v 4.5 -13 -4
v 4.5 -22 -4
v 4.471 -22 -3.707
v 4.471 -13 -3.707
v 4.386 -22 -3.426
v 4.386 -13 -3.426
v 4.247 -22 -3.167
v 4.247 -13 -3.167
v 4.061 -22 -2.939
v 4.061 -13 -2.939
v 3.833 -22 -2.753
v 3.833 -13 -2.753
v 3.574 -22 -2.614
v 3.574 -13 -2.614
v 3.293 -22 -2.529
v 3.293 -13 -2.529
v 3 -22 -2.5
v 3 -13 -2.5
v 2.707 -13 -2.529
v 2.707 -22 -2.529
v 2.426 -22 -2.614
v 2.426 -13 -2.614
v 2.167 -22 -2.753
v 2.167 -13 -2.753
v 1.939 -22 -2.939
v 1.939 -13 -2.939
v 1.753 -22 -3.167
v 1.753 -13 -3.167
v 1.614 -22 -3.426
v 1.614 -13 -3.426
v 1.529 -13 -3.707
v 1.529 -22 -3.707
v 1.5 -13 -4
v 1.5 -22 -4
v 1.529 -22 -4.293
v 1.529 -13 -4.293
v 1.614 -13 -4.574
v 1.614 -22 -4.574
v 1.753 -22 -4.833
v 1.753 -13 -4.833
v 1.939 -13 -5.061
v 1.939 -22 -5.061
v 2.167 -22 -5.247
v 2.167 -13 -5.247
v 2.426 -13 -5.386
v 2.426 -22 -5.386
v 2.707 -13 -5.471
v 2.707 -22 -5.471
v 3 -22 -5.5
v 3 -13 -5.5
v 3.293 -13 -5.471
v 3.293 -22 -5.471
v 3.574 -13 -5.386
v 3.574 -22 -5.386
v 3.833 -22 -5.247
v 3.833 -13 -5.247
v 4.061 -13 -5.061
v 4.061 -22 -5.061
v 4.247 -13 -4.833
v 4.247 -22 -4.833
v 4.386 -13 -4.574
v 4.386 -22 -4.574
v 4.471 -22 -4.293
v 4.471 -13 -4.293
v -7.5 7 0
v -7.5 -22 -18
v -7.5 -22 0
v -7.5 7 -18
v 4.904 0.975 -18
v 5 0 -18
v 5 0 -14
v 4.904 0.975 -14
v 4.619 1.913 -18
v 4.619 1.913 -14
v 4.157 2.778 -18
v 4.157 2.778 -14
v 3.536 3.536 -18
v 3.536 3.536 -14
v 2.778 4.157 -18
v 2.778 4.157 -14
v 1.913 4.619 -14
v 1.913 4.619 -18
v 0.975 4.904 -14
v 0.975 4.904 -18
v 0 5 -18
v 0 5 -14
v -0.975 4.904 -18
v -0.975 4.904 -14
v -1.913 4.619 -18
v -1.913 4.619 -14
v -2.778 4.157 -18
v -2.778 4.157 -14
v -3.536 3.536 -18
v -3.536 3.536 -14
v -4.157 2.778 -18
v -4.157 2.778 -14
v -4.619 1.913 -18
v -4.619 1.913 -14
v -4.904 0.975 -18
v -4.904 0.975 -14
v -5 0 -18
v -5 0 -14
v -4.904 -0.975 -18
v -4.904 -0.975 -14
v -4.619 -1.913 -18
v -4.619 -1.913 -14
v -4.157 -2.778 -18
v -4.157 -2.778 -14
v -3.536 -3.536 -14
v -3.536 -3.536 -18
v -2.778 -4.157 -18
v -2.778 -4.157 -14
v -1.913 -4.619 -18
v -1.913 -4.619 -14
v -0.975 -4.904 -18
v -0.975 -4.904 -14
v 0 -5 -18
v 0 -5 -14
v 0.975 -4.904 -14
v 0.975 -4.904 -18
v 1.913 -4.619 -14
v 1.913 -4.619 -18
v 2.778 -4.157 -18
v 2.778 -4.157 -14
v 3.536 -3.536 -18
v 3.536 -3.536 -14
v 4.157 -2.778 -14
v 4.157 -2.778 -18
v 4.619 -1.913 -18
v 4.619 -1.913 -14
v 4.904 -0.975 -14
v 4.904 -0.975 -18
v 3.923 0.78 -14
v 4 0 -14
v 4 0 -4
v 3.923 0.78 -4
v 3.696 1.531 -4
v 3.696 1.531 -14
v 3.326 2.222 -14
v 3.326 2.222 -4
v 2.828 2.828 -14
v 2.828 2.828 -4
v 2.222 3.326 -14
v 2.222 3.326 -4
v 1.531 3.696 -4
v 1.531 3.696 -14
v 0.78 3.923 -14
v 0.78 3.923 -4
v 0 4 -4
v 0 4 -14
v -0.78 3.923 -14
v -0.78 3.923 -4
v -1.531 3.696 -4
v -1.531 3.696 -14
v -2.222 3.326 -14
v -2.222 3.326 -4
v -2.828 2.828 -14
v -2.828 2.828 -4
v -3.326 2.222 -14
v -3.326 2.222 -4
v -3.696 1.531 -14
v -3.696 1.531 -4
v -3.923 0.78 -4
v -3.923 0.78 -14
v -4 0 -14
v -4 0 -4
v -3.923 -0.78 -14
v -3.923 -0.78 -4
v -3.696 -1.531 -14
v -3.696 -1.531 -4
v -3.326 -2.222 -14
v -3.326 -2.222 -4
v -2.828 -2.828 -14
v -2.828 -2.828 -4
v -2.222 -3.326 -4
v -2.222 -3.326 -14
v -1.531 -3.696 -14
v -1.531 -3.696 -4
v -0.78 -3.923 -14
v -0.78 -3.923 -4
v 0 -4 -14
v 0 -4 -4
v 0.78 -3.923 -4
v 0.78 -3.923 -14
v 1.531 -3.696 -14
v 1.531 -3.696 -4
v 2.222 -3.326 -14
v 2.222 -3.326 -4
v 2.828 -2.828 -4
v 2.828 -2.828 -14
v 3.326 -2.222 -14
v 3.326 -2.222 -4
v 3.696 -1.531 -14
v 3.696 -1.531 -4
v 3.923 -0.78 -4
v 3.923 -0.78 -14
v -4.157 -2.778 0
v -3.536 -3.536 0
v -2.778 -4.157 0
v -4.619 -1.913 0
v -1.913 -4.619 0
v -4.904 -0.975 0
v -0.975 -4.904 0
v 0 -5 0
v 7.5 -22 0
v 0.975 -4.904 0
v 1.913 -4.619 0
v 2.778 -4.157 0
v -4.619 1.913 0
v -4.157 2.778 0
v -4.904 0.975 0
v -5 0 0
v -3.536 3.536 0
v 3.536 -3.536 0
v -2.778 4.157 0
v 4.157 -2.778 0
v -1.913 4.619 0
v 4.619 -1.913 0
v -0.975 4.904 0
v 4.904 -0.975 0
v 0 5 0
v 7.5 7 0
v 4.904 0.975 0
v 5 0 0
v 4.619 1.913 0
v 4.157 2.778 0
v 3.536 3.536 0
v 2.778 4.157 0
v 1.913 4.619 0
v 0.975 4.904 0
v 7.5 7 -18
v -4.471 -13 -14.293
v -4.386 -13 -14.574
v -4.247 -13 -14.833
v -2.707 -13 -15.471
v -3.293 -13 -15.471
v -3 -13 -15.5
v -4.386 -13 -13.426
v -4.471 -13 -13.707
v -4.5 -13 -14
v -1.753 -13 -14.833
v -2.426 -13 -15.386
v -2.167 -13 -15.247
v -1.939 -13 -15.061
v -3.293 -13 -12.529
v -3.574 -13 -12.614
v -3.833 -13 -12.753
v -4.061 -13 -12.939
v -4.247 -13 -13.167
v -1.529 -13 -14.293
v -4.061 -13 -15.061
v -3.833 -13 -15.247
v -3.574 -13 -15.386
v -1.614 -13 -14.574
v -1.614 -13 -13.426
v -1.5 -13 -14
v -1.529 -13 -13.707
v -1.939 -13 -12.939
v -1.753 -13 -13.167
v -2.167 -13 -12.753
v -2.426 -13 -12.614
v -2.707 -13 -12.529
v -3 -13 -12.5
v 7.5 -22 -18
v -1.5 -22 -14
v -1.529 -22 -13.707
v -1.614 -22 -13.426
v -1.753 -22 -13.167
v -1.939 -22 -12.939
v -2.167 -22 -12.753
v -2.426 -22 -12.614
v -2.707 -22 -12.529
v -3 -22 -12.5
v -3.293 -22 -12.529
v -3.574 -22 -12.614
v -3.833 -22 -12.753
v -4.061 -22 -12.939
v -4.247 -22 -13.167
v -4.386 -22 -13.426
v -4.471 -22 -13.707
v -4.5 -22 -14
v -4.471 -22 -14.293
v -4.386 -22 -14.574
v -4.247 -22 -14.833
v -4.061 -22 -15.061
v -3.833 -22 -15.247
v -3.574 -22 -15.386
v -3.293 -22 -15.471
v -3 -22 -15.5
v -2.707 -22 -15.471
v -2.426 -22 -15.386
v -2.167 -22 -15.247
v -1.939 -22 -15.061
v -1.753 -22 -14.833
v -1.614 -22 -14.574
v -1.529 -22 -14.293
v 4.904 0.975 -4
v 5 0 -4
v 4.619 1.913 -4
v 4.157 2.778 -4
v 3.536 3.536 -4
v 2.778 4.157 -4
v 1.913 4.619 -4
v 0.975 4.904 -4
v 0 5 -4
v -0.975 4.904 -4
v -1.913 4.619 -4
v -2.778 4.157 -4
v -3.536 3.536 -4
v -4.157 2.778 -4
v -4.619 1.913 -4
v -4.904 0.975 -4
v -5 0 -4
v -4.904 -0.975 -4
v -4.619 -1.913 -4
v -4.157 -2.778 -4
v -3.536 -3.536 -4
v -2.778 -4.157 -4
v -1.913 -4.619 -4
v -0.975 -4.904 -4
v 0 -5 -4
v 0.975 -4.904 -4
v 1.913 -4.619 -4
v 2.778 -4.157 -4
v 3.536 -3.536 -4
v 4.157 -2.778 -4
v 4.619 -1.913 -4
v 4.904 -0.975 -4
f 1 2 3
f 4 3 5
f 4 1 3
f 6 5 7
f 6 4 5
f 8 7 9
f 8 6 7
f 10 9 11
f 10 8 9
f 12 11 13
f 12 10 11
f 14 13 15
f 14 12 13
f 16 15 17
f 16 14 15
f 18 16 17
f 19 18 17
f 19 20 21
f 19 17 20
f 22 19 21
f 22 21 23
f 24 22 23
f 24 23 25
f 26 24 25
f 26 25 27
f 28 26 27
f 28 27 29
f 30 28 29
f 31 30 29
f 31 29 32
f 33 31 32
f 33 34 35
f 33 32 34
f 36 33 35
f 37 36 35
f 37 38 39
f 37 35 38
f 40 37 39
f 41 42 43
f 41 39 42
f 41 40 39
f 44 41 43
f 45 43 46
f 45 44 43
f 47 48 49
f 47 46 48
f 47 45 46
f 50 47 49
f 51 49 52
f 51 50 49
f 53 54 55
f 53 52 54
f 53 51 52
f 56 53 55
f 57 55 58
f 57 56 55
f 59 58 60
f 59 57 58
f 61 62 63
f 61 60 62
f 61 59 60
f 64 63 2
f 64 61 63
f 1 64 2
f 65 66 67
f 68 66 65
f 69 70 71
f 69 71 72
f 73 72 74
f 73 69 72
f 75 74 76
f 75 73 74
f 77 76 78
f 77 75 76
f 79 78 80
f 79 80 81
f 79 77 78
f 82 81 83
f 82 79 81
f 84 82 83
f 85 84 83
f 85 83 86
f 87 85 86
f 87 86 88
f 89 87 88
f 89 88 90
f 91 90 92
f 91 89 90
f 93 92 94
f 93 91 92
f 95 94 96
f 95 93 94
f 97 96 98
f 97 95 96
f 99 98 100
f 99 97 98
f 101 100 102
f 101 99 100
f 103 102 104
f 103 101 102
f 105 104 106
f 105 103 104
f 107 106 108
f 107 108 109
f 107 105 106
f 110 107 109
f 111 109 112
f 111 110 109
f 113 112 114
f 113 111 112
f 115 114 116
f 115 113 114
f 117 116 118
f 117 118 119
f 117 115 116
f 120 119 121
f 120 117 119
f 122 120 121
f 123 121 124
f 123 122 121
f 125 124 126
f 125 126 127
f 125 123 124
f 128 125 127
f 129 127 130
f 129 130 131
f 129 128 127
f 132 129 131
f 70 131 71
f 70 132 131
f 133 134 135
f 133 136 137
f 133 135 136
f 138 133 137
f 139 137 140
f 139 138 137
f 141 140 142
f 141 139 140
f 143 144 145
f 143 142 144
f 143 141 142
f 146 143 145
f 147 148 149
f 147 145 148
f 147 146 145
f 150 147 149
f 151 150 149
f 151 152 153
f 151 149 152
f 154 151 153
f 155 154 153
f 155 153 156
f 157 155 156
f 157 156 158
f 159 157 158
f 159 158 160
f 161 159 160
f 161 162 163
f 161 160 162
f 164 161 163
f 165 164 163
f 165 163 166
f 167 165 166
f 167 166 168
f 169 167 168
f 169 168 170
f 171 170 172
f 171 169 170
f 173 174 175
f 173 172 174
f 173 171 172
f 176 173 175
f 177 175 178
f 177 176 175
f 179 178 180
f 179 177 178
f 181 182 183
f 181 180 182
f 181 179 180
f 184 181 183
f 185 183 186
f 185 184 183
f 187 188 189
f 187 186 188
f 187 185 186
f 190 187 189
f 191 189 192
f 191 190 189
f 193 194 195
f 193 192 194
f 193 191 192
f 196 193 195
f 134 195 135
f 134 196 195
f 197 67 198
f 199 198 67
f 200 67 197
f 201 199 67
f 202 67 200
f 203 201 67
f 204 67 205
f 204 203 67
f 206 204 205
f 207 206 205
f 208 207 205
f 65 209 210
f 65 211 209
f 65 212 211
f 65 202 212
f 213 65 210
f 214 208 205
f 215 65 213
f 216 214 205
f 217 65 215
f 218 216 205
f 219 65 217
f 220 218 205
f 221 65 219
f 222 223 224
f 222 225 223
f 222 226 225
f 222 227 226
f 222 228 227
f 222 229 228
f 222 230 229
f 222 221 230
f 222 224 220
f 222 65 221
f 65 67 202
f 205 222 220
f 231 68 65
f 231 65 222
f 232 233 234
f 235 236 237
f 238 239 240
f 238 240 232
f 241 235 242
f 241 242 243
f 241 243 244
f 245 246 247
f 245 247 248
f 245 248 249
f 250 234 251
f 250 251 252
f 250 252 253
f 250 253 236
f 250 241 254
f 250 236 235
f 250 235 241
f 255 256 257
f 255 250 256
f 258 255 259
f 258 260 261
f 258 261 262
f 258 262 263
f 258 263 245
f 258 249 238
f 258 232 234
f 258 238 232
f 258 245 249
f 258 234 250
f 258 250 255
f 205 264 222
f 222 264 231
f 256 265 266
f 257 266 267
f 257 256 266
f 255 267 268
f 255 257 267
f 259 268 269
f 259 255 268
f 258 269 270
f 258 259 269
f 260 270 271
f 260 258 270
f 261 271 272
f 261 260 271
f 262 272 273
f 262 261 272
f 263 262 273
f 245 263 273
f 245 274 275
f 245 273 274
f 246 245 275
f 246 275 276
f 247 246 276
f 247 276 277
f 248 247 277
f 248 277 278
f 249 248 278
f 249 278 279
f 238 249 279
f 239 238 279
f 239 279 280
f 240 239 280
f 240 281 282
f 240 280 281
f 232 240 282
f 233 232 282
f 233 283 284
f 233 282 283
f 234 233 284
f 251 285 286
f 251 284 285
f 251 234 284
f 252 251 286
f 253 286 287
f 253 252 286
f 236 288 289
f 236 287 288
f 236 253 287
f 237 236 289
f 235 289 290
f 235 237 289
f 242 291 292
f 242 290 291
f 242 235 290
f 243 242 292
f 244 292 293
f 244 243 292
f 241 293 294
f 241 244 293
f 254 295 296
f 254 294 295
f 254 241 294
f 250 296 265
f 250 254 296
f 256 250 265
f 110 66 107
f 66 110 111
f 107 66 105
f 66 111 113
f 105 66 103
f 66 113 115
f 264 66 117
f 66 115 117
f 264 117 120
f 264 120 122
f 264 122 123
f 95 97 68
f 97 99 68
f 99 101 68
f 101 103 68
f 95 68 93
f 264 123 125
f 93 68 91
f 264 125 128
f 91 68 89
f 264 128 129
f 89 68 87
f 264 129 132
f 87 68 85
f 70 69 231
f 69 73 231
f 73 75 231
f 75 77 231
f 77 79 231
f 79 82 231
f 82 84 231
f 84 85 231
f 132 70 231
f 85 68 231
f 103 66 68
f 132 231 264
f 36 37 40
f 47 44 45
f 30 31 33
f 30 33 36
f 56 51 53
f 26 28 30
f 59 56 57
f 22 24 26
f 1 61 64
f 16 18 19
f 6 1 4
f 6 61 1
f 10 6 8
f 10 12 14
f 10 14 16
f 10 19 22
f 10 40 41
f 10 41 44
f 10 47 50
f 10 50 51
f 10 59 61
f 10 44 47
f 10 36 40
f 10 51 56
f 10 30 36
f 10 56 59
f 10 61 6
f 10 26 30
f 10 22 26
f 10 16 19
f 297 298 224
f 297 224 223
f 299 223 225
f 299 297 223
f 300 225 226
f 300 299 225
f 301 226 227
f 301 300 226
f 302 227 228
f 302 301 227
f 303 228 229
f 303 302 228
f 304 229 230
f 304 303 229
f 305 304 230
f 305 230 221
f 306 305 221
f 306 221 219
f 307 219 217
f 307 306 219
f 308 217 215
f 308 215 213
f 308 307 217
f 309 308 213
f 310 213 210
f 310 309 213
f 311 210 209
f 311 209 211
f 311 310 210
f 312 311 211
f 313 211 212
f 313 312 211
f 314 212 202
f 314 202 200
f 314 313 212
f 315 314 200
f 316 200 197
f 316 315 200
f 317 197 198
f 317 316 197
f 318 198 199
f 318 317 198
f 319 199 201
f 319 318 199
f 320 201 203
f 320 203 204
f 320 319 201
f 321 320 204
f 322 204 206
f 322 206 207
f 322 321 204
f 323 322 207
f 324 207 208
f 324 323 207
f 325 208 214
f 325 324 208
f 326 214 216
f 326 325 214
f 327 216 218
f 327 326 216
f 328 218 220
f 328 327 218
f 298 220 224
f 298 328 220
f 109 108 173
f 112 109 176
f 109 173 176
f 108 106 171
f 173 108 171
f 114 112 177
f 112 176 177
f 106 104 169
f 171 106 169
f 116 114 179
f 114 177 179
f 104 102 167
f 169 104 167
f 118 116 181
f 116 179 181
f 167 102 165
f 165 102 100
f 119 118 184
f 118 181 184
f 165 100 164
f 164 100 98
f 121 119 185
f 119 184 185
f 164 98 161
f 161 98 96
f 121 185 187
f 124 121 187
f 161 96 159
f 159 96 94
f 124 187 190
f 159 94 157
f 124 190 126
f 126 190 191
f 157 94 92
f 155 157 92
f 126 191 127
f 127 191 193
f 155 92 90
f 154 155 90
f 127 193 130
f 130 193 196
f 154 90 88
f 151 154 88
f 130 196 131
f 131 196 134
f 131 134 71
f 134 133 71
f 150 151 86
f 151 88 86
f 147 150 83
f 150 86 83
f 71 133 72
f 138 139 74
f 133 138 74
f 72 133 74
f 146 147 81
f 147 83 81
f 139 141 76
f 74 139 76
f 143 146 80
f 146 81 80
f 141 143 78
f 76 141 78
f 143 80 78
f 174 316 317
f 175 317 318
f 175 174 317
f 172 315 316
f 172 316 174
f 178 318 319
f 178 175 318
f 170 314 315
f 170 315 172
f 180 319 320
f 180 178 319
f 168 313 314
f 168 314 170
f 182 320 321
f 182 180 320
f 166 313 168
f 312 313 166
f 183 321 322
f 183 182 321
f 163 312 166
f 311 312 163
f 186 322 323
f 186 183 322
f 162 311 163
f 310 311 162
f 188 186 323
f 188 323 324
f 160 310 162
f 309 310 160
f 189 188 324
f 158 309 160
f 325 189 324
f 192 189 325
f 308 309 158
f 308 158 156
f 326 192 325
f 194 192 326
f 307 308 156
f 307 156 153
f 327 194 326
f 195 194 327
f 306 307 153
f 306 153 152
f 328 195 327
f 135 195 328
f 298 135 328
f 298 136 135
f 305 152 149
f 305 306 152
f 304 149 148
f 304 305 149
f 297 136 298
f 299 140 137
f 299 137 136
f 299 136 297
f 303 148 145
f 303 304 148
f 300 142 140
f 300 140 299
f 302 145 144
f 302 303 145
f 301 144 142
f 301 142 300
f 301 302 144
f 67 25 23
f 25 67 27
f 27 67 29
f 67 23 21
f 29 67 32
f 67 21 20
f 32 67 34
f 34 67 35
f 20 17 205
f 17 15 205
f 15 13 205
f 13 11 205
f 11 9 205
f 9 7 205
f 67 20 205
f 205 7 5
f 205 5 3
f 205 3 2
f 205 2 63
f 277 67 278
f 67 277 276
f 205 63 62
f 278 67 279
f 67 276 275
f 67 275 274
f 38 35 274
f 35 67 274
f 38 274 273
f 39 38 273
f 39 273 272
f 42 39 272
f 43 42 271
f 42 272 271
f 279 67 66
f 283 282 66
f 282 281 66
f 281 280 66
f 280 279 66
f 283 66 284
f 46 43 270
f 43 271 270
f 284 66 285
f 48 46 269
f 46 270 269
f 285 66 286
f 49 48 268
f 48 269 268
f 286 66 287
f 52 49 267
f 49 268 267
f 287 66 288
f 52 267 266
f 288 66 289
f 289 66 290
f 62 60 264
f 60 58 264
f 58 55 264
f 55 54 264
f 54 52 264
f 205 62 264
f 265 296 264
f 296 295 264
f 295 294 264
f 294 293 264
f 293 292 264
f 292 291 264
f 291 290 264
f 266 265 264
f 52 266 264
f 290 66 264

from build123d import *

# Parameters (mm, degrees)
CYLINDER095_R      = 1.5
CYLINDER095_DEPTH  = 21
CYLINDER094_R      = 1.5
CYLINDER094_DEPTH  = 21
CYLINDER085_R      = 4
CYLINDER085_DEPTH  = 19
CYLINDER087_R      = 5
CYLINDER087_DEPTH  = 4
CYLINDER086_R      = 5
CYLINDER086_DEPTH  = 4
BOX406008013_W     = 15
BOX406008013_H     = 29
BOX406008013_DEPTH = 18


with BuildPart() as cylinder095:
    # Cylinder095 → Cylinder095 (new body)
    with BuildSketch(Plane(origin=(3, -13, -4), x_dir=(1, 0, 0), z_dir=(0, -1, 0))):
        Circle(CYLINDER095_R)
    extrude(amount=CYLINDER095_DEPTH)


with BuildPart() as fusion103077013004017014:
    # Cylinder094 → Cylinder094 (new body)
    with BuildSketch(Plane(origin=(-3, -13, -14), x_dir=(1, 0, 0), z_dir=(0, -1, 0))):
        Circle(CYLINDER094_R)
    extrude(amount=CYLINDER094_DEPTH)

    # Fusion103077013004017014: union Cylinder095
    add(cylinder095.part)


with BuildPart() as cylinder081:
    # Cylinder085 → Cylinder085 (new body)
    with BuildSketch(Plane.XY.offset(-17)):
        Circle(CYLINDER085_R)
    extrude(amount=CYLINDER085_DEPTH)


with BuildPart() as f_623_bearing003:
    # Cylinder087 → Cylinder087 (new body)
    with BuildSketch(Plane.XY.offset(-18)):
        Circle(CYLINDER087_R)
    extrude(amount=CYLINDER087_DEPTH)


with BuildPart() as f_623_bearing_holes:
    # Cylinder086 → Cylinder086 (new body)
    with BuildSketch(Plane.XY.offset(-4)):
        Circle(CYLINDER086_R)
    extrude(amount=CYLINDER086_DEPTH)

    # Fusion103077013004017008: union 623 Bearing003
    add(f_623_bearing003.part)


with BuildPart() as cut088:
    # Box406008013 → Box406008013 (new body)
    with BuildSketch(Plane(origin=(-7.5, -22, -18), x_dir=(1, 0, 0), z_dir=(0, 0, 1))):
        with Locations((7.5, 14.5)):
            Rectangle(BOX406008013_W, BOX406008013_H)
    extrude(amount=BOX406008013_DEPTH)

    # Cut070: cut 623 Bearing Holes
    add(f_623_bearing_holes.part, mode=Mode.SUBTRACT)

    # Cut087: cut Cylinder081
    add(cylinder081.part, mode=Mode.SUBTRACT)

    # Cut088: cut Fusion103077013004017014
    add(fusion103077013004017014.part, mode=Mode.SUBTRACT)


solid = cut088.part
